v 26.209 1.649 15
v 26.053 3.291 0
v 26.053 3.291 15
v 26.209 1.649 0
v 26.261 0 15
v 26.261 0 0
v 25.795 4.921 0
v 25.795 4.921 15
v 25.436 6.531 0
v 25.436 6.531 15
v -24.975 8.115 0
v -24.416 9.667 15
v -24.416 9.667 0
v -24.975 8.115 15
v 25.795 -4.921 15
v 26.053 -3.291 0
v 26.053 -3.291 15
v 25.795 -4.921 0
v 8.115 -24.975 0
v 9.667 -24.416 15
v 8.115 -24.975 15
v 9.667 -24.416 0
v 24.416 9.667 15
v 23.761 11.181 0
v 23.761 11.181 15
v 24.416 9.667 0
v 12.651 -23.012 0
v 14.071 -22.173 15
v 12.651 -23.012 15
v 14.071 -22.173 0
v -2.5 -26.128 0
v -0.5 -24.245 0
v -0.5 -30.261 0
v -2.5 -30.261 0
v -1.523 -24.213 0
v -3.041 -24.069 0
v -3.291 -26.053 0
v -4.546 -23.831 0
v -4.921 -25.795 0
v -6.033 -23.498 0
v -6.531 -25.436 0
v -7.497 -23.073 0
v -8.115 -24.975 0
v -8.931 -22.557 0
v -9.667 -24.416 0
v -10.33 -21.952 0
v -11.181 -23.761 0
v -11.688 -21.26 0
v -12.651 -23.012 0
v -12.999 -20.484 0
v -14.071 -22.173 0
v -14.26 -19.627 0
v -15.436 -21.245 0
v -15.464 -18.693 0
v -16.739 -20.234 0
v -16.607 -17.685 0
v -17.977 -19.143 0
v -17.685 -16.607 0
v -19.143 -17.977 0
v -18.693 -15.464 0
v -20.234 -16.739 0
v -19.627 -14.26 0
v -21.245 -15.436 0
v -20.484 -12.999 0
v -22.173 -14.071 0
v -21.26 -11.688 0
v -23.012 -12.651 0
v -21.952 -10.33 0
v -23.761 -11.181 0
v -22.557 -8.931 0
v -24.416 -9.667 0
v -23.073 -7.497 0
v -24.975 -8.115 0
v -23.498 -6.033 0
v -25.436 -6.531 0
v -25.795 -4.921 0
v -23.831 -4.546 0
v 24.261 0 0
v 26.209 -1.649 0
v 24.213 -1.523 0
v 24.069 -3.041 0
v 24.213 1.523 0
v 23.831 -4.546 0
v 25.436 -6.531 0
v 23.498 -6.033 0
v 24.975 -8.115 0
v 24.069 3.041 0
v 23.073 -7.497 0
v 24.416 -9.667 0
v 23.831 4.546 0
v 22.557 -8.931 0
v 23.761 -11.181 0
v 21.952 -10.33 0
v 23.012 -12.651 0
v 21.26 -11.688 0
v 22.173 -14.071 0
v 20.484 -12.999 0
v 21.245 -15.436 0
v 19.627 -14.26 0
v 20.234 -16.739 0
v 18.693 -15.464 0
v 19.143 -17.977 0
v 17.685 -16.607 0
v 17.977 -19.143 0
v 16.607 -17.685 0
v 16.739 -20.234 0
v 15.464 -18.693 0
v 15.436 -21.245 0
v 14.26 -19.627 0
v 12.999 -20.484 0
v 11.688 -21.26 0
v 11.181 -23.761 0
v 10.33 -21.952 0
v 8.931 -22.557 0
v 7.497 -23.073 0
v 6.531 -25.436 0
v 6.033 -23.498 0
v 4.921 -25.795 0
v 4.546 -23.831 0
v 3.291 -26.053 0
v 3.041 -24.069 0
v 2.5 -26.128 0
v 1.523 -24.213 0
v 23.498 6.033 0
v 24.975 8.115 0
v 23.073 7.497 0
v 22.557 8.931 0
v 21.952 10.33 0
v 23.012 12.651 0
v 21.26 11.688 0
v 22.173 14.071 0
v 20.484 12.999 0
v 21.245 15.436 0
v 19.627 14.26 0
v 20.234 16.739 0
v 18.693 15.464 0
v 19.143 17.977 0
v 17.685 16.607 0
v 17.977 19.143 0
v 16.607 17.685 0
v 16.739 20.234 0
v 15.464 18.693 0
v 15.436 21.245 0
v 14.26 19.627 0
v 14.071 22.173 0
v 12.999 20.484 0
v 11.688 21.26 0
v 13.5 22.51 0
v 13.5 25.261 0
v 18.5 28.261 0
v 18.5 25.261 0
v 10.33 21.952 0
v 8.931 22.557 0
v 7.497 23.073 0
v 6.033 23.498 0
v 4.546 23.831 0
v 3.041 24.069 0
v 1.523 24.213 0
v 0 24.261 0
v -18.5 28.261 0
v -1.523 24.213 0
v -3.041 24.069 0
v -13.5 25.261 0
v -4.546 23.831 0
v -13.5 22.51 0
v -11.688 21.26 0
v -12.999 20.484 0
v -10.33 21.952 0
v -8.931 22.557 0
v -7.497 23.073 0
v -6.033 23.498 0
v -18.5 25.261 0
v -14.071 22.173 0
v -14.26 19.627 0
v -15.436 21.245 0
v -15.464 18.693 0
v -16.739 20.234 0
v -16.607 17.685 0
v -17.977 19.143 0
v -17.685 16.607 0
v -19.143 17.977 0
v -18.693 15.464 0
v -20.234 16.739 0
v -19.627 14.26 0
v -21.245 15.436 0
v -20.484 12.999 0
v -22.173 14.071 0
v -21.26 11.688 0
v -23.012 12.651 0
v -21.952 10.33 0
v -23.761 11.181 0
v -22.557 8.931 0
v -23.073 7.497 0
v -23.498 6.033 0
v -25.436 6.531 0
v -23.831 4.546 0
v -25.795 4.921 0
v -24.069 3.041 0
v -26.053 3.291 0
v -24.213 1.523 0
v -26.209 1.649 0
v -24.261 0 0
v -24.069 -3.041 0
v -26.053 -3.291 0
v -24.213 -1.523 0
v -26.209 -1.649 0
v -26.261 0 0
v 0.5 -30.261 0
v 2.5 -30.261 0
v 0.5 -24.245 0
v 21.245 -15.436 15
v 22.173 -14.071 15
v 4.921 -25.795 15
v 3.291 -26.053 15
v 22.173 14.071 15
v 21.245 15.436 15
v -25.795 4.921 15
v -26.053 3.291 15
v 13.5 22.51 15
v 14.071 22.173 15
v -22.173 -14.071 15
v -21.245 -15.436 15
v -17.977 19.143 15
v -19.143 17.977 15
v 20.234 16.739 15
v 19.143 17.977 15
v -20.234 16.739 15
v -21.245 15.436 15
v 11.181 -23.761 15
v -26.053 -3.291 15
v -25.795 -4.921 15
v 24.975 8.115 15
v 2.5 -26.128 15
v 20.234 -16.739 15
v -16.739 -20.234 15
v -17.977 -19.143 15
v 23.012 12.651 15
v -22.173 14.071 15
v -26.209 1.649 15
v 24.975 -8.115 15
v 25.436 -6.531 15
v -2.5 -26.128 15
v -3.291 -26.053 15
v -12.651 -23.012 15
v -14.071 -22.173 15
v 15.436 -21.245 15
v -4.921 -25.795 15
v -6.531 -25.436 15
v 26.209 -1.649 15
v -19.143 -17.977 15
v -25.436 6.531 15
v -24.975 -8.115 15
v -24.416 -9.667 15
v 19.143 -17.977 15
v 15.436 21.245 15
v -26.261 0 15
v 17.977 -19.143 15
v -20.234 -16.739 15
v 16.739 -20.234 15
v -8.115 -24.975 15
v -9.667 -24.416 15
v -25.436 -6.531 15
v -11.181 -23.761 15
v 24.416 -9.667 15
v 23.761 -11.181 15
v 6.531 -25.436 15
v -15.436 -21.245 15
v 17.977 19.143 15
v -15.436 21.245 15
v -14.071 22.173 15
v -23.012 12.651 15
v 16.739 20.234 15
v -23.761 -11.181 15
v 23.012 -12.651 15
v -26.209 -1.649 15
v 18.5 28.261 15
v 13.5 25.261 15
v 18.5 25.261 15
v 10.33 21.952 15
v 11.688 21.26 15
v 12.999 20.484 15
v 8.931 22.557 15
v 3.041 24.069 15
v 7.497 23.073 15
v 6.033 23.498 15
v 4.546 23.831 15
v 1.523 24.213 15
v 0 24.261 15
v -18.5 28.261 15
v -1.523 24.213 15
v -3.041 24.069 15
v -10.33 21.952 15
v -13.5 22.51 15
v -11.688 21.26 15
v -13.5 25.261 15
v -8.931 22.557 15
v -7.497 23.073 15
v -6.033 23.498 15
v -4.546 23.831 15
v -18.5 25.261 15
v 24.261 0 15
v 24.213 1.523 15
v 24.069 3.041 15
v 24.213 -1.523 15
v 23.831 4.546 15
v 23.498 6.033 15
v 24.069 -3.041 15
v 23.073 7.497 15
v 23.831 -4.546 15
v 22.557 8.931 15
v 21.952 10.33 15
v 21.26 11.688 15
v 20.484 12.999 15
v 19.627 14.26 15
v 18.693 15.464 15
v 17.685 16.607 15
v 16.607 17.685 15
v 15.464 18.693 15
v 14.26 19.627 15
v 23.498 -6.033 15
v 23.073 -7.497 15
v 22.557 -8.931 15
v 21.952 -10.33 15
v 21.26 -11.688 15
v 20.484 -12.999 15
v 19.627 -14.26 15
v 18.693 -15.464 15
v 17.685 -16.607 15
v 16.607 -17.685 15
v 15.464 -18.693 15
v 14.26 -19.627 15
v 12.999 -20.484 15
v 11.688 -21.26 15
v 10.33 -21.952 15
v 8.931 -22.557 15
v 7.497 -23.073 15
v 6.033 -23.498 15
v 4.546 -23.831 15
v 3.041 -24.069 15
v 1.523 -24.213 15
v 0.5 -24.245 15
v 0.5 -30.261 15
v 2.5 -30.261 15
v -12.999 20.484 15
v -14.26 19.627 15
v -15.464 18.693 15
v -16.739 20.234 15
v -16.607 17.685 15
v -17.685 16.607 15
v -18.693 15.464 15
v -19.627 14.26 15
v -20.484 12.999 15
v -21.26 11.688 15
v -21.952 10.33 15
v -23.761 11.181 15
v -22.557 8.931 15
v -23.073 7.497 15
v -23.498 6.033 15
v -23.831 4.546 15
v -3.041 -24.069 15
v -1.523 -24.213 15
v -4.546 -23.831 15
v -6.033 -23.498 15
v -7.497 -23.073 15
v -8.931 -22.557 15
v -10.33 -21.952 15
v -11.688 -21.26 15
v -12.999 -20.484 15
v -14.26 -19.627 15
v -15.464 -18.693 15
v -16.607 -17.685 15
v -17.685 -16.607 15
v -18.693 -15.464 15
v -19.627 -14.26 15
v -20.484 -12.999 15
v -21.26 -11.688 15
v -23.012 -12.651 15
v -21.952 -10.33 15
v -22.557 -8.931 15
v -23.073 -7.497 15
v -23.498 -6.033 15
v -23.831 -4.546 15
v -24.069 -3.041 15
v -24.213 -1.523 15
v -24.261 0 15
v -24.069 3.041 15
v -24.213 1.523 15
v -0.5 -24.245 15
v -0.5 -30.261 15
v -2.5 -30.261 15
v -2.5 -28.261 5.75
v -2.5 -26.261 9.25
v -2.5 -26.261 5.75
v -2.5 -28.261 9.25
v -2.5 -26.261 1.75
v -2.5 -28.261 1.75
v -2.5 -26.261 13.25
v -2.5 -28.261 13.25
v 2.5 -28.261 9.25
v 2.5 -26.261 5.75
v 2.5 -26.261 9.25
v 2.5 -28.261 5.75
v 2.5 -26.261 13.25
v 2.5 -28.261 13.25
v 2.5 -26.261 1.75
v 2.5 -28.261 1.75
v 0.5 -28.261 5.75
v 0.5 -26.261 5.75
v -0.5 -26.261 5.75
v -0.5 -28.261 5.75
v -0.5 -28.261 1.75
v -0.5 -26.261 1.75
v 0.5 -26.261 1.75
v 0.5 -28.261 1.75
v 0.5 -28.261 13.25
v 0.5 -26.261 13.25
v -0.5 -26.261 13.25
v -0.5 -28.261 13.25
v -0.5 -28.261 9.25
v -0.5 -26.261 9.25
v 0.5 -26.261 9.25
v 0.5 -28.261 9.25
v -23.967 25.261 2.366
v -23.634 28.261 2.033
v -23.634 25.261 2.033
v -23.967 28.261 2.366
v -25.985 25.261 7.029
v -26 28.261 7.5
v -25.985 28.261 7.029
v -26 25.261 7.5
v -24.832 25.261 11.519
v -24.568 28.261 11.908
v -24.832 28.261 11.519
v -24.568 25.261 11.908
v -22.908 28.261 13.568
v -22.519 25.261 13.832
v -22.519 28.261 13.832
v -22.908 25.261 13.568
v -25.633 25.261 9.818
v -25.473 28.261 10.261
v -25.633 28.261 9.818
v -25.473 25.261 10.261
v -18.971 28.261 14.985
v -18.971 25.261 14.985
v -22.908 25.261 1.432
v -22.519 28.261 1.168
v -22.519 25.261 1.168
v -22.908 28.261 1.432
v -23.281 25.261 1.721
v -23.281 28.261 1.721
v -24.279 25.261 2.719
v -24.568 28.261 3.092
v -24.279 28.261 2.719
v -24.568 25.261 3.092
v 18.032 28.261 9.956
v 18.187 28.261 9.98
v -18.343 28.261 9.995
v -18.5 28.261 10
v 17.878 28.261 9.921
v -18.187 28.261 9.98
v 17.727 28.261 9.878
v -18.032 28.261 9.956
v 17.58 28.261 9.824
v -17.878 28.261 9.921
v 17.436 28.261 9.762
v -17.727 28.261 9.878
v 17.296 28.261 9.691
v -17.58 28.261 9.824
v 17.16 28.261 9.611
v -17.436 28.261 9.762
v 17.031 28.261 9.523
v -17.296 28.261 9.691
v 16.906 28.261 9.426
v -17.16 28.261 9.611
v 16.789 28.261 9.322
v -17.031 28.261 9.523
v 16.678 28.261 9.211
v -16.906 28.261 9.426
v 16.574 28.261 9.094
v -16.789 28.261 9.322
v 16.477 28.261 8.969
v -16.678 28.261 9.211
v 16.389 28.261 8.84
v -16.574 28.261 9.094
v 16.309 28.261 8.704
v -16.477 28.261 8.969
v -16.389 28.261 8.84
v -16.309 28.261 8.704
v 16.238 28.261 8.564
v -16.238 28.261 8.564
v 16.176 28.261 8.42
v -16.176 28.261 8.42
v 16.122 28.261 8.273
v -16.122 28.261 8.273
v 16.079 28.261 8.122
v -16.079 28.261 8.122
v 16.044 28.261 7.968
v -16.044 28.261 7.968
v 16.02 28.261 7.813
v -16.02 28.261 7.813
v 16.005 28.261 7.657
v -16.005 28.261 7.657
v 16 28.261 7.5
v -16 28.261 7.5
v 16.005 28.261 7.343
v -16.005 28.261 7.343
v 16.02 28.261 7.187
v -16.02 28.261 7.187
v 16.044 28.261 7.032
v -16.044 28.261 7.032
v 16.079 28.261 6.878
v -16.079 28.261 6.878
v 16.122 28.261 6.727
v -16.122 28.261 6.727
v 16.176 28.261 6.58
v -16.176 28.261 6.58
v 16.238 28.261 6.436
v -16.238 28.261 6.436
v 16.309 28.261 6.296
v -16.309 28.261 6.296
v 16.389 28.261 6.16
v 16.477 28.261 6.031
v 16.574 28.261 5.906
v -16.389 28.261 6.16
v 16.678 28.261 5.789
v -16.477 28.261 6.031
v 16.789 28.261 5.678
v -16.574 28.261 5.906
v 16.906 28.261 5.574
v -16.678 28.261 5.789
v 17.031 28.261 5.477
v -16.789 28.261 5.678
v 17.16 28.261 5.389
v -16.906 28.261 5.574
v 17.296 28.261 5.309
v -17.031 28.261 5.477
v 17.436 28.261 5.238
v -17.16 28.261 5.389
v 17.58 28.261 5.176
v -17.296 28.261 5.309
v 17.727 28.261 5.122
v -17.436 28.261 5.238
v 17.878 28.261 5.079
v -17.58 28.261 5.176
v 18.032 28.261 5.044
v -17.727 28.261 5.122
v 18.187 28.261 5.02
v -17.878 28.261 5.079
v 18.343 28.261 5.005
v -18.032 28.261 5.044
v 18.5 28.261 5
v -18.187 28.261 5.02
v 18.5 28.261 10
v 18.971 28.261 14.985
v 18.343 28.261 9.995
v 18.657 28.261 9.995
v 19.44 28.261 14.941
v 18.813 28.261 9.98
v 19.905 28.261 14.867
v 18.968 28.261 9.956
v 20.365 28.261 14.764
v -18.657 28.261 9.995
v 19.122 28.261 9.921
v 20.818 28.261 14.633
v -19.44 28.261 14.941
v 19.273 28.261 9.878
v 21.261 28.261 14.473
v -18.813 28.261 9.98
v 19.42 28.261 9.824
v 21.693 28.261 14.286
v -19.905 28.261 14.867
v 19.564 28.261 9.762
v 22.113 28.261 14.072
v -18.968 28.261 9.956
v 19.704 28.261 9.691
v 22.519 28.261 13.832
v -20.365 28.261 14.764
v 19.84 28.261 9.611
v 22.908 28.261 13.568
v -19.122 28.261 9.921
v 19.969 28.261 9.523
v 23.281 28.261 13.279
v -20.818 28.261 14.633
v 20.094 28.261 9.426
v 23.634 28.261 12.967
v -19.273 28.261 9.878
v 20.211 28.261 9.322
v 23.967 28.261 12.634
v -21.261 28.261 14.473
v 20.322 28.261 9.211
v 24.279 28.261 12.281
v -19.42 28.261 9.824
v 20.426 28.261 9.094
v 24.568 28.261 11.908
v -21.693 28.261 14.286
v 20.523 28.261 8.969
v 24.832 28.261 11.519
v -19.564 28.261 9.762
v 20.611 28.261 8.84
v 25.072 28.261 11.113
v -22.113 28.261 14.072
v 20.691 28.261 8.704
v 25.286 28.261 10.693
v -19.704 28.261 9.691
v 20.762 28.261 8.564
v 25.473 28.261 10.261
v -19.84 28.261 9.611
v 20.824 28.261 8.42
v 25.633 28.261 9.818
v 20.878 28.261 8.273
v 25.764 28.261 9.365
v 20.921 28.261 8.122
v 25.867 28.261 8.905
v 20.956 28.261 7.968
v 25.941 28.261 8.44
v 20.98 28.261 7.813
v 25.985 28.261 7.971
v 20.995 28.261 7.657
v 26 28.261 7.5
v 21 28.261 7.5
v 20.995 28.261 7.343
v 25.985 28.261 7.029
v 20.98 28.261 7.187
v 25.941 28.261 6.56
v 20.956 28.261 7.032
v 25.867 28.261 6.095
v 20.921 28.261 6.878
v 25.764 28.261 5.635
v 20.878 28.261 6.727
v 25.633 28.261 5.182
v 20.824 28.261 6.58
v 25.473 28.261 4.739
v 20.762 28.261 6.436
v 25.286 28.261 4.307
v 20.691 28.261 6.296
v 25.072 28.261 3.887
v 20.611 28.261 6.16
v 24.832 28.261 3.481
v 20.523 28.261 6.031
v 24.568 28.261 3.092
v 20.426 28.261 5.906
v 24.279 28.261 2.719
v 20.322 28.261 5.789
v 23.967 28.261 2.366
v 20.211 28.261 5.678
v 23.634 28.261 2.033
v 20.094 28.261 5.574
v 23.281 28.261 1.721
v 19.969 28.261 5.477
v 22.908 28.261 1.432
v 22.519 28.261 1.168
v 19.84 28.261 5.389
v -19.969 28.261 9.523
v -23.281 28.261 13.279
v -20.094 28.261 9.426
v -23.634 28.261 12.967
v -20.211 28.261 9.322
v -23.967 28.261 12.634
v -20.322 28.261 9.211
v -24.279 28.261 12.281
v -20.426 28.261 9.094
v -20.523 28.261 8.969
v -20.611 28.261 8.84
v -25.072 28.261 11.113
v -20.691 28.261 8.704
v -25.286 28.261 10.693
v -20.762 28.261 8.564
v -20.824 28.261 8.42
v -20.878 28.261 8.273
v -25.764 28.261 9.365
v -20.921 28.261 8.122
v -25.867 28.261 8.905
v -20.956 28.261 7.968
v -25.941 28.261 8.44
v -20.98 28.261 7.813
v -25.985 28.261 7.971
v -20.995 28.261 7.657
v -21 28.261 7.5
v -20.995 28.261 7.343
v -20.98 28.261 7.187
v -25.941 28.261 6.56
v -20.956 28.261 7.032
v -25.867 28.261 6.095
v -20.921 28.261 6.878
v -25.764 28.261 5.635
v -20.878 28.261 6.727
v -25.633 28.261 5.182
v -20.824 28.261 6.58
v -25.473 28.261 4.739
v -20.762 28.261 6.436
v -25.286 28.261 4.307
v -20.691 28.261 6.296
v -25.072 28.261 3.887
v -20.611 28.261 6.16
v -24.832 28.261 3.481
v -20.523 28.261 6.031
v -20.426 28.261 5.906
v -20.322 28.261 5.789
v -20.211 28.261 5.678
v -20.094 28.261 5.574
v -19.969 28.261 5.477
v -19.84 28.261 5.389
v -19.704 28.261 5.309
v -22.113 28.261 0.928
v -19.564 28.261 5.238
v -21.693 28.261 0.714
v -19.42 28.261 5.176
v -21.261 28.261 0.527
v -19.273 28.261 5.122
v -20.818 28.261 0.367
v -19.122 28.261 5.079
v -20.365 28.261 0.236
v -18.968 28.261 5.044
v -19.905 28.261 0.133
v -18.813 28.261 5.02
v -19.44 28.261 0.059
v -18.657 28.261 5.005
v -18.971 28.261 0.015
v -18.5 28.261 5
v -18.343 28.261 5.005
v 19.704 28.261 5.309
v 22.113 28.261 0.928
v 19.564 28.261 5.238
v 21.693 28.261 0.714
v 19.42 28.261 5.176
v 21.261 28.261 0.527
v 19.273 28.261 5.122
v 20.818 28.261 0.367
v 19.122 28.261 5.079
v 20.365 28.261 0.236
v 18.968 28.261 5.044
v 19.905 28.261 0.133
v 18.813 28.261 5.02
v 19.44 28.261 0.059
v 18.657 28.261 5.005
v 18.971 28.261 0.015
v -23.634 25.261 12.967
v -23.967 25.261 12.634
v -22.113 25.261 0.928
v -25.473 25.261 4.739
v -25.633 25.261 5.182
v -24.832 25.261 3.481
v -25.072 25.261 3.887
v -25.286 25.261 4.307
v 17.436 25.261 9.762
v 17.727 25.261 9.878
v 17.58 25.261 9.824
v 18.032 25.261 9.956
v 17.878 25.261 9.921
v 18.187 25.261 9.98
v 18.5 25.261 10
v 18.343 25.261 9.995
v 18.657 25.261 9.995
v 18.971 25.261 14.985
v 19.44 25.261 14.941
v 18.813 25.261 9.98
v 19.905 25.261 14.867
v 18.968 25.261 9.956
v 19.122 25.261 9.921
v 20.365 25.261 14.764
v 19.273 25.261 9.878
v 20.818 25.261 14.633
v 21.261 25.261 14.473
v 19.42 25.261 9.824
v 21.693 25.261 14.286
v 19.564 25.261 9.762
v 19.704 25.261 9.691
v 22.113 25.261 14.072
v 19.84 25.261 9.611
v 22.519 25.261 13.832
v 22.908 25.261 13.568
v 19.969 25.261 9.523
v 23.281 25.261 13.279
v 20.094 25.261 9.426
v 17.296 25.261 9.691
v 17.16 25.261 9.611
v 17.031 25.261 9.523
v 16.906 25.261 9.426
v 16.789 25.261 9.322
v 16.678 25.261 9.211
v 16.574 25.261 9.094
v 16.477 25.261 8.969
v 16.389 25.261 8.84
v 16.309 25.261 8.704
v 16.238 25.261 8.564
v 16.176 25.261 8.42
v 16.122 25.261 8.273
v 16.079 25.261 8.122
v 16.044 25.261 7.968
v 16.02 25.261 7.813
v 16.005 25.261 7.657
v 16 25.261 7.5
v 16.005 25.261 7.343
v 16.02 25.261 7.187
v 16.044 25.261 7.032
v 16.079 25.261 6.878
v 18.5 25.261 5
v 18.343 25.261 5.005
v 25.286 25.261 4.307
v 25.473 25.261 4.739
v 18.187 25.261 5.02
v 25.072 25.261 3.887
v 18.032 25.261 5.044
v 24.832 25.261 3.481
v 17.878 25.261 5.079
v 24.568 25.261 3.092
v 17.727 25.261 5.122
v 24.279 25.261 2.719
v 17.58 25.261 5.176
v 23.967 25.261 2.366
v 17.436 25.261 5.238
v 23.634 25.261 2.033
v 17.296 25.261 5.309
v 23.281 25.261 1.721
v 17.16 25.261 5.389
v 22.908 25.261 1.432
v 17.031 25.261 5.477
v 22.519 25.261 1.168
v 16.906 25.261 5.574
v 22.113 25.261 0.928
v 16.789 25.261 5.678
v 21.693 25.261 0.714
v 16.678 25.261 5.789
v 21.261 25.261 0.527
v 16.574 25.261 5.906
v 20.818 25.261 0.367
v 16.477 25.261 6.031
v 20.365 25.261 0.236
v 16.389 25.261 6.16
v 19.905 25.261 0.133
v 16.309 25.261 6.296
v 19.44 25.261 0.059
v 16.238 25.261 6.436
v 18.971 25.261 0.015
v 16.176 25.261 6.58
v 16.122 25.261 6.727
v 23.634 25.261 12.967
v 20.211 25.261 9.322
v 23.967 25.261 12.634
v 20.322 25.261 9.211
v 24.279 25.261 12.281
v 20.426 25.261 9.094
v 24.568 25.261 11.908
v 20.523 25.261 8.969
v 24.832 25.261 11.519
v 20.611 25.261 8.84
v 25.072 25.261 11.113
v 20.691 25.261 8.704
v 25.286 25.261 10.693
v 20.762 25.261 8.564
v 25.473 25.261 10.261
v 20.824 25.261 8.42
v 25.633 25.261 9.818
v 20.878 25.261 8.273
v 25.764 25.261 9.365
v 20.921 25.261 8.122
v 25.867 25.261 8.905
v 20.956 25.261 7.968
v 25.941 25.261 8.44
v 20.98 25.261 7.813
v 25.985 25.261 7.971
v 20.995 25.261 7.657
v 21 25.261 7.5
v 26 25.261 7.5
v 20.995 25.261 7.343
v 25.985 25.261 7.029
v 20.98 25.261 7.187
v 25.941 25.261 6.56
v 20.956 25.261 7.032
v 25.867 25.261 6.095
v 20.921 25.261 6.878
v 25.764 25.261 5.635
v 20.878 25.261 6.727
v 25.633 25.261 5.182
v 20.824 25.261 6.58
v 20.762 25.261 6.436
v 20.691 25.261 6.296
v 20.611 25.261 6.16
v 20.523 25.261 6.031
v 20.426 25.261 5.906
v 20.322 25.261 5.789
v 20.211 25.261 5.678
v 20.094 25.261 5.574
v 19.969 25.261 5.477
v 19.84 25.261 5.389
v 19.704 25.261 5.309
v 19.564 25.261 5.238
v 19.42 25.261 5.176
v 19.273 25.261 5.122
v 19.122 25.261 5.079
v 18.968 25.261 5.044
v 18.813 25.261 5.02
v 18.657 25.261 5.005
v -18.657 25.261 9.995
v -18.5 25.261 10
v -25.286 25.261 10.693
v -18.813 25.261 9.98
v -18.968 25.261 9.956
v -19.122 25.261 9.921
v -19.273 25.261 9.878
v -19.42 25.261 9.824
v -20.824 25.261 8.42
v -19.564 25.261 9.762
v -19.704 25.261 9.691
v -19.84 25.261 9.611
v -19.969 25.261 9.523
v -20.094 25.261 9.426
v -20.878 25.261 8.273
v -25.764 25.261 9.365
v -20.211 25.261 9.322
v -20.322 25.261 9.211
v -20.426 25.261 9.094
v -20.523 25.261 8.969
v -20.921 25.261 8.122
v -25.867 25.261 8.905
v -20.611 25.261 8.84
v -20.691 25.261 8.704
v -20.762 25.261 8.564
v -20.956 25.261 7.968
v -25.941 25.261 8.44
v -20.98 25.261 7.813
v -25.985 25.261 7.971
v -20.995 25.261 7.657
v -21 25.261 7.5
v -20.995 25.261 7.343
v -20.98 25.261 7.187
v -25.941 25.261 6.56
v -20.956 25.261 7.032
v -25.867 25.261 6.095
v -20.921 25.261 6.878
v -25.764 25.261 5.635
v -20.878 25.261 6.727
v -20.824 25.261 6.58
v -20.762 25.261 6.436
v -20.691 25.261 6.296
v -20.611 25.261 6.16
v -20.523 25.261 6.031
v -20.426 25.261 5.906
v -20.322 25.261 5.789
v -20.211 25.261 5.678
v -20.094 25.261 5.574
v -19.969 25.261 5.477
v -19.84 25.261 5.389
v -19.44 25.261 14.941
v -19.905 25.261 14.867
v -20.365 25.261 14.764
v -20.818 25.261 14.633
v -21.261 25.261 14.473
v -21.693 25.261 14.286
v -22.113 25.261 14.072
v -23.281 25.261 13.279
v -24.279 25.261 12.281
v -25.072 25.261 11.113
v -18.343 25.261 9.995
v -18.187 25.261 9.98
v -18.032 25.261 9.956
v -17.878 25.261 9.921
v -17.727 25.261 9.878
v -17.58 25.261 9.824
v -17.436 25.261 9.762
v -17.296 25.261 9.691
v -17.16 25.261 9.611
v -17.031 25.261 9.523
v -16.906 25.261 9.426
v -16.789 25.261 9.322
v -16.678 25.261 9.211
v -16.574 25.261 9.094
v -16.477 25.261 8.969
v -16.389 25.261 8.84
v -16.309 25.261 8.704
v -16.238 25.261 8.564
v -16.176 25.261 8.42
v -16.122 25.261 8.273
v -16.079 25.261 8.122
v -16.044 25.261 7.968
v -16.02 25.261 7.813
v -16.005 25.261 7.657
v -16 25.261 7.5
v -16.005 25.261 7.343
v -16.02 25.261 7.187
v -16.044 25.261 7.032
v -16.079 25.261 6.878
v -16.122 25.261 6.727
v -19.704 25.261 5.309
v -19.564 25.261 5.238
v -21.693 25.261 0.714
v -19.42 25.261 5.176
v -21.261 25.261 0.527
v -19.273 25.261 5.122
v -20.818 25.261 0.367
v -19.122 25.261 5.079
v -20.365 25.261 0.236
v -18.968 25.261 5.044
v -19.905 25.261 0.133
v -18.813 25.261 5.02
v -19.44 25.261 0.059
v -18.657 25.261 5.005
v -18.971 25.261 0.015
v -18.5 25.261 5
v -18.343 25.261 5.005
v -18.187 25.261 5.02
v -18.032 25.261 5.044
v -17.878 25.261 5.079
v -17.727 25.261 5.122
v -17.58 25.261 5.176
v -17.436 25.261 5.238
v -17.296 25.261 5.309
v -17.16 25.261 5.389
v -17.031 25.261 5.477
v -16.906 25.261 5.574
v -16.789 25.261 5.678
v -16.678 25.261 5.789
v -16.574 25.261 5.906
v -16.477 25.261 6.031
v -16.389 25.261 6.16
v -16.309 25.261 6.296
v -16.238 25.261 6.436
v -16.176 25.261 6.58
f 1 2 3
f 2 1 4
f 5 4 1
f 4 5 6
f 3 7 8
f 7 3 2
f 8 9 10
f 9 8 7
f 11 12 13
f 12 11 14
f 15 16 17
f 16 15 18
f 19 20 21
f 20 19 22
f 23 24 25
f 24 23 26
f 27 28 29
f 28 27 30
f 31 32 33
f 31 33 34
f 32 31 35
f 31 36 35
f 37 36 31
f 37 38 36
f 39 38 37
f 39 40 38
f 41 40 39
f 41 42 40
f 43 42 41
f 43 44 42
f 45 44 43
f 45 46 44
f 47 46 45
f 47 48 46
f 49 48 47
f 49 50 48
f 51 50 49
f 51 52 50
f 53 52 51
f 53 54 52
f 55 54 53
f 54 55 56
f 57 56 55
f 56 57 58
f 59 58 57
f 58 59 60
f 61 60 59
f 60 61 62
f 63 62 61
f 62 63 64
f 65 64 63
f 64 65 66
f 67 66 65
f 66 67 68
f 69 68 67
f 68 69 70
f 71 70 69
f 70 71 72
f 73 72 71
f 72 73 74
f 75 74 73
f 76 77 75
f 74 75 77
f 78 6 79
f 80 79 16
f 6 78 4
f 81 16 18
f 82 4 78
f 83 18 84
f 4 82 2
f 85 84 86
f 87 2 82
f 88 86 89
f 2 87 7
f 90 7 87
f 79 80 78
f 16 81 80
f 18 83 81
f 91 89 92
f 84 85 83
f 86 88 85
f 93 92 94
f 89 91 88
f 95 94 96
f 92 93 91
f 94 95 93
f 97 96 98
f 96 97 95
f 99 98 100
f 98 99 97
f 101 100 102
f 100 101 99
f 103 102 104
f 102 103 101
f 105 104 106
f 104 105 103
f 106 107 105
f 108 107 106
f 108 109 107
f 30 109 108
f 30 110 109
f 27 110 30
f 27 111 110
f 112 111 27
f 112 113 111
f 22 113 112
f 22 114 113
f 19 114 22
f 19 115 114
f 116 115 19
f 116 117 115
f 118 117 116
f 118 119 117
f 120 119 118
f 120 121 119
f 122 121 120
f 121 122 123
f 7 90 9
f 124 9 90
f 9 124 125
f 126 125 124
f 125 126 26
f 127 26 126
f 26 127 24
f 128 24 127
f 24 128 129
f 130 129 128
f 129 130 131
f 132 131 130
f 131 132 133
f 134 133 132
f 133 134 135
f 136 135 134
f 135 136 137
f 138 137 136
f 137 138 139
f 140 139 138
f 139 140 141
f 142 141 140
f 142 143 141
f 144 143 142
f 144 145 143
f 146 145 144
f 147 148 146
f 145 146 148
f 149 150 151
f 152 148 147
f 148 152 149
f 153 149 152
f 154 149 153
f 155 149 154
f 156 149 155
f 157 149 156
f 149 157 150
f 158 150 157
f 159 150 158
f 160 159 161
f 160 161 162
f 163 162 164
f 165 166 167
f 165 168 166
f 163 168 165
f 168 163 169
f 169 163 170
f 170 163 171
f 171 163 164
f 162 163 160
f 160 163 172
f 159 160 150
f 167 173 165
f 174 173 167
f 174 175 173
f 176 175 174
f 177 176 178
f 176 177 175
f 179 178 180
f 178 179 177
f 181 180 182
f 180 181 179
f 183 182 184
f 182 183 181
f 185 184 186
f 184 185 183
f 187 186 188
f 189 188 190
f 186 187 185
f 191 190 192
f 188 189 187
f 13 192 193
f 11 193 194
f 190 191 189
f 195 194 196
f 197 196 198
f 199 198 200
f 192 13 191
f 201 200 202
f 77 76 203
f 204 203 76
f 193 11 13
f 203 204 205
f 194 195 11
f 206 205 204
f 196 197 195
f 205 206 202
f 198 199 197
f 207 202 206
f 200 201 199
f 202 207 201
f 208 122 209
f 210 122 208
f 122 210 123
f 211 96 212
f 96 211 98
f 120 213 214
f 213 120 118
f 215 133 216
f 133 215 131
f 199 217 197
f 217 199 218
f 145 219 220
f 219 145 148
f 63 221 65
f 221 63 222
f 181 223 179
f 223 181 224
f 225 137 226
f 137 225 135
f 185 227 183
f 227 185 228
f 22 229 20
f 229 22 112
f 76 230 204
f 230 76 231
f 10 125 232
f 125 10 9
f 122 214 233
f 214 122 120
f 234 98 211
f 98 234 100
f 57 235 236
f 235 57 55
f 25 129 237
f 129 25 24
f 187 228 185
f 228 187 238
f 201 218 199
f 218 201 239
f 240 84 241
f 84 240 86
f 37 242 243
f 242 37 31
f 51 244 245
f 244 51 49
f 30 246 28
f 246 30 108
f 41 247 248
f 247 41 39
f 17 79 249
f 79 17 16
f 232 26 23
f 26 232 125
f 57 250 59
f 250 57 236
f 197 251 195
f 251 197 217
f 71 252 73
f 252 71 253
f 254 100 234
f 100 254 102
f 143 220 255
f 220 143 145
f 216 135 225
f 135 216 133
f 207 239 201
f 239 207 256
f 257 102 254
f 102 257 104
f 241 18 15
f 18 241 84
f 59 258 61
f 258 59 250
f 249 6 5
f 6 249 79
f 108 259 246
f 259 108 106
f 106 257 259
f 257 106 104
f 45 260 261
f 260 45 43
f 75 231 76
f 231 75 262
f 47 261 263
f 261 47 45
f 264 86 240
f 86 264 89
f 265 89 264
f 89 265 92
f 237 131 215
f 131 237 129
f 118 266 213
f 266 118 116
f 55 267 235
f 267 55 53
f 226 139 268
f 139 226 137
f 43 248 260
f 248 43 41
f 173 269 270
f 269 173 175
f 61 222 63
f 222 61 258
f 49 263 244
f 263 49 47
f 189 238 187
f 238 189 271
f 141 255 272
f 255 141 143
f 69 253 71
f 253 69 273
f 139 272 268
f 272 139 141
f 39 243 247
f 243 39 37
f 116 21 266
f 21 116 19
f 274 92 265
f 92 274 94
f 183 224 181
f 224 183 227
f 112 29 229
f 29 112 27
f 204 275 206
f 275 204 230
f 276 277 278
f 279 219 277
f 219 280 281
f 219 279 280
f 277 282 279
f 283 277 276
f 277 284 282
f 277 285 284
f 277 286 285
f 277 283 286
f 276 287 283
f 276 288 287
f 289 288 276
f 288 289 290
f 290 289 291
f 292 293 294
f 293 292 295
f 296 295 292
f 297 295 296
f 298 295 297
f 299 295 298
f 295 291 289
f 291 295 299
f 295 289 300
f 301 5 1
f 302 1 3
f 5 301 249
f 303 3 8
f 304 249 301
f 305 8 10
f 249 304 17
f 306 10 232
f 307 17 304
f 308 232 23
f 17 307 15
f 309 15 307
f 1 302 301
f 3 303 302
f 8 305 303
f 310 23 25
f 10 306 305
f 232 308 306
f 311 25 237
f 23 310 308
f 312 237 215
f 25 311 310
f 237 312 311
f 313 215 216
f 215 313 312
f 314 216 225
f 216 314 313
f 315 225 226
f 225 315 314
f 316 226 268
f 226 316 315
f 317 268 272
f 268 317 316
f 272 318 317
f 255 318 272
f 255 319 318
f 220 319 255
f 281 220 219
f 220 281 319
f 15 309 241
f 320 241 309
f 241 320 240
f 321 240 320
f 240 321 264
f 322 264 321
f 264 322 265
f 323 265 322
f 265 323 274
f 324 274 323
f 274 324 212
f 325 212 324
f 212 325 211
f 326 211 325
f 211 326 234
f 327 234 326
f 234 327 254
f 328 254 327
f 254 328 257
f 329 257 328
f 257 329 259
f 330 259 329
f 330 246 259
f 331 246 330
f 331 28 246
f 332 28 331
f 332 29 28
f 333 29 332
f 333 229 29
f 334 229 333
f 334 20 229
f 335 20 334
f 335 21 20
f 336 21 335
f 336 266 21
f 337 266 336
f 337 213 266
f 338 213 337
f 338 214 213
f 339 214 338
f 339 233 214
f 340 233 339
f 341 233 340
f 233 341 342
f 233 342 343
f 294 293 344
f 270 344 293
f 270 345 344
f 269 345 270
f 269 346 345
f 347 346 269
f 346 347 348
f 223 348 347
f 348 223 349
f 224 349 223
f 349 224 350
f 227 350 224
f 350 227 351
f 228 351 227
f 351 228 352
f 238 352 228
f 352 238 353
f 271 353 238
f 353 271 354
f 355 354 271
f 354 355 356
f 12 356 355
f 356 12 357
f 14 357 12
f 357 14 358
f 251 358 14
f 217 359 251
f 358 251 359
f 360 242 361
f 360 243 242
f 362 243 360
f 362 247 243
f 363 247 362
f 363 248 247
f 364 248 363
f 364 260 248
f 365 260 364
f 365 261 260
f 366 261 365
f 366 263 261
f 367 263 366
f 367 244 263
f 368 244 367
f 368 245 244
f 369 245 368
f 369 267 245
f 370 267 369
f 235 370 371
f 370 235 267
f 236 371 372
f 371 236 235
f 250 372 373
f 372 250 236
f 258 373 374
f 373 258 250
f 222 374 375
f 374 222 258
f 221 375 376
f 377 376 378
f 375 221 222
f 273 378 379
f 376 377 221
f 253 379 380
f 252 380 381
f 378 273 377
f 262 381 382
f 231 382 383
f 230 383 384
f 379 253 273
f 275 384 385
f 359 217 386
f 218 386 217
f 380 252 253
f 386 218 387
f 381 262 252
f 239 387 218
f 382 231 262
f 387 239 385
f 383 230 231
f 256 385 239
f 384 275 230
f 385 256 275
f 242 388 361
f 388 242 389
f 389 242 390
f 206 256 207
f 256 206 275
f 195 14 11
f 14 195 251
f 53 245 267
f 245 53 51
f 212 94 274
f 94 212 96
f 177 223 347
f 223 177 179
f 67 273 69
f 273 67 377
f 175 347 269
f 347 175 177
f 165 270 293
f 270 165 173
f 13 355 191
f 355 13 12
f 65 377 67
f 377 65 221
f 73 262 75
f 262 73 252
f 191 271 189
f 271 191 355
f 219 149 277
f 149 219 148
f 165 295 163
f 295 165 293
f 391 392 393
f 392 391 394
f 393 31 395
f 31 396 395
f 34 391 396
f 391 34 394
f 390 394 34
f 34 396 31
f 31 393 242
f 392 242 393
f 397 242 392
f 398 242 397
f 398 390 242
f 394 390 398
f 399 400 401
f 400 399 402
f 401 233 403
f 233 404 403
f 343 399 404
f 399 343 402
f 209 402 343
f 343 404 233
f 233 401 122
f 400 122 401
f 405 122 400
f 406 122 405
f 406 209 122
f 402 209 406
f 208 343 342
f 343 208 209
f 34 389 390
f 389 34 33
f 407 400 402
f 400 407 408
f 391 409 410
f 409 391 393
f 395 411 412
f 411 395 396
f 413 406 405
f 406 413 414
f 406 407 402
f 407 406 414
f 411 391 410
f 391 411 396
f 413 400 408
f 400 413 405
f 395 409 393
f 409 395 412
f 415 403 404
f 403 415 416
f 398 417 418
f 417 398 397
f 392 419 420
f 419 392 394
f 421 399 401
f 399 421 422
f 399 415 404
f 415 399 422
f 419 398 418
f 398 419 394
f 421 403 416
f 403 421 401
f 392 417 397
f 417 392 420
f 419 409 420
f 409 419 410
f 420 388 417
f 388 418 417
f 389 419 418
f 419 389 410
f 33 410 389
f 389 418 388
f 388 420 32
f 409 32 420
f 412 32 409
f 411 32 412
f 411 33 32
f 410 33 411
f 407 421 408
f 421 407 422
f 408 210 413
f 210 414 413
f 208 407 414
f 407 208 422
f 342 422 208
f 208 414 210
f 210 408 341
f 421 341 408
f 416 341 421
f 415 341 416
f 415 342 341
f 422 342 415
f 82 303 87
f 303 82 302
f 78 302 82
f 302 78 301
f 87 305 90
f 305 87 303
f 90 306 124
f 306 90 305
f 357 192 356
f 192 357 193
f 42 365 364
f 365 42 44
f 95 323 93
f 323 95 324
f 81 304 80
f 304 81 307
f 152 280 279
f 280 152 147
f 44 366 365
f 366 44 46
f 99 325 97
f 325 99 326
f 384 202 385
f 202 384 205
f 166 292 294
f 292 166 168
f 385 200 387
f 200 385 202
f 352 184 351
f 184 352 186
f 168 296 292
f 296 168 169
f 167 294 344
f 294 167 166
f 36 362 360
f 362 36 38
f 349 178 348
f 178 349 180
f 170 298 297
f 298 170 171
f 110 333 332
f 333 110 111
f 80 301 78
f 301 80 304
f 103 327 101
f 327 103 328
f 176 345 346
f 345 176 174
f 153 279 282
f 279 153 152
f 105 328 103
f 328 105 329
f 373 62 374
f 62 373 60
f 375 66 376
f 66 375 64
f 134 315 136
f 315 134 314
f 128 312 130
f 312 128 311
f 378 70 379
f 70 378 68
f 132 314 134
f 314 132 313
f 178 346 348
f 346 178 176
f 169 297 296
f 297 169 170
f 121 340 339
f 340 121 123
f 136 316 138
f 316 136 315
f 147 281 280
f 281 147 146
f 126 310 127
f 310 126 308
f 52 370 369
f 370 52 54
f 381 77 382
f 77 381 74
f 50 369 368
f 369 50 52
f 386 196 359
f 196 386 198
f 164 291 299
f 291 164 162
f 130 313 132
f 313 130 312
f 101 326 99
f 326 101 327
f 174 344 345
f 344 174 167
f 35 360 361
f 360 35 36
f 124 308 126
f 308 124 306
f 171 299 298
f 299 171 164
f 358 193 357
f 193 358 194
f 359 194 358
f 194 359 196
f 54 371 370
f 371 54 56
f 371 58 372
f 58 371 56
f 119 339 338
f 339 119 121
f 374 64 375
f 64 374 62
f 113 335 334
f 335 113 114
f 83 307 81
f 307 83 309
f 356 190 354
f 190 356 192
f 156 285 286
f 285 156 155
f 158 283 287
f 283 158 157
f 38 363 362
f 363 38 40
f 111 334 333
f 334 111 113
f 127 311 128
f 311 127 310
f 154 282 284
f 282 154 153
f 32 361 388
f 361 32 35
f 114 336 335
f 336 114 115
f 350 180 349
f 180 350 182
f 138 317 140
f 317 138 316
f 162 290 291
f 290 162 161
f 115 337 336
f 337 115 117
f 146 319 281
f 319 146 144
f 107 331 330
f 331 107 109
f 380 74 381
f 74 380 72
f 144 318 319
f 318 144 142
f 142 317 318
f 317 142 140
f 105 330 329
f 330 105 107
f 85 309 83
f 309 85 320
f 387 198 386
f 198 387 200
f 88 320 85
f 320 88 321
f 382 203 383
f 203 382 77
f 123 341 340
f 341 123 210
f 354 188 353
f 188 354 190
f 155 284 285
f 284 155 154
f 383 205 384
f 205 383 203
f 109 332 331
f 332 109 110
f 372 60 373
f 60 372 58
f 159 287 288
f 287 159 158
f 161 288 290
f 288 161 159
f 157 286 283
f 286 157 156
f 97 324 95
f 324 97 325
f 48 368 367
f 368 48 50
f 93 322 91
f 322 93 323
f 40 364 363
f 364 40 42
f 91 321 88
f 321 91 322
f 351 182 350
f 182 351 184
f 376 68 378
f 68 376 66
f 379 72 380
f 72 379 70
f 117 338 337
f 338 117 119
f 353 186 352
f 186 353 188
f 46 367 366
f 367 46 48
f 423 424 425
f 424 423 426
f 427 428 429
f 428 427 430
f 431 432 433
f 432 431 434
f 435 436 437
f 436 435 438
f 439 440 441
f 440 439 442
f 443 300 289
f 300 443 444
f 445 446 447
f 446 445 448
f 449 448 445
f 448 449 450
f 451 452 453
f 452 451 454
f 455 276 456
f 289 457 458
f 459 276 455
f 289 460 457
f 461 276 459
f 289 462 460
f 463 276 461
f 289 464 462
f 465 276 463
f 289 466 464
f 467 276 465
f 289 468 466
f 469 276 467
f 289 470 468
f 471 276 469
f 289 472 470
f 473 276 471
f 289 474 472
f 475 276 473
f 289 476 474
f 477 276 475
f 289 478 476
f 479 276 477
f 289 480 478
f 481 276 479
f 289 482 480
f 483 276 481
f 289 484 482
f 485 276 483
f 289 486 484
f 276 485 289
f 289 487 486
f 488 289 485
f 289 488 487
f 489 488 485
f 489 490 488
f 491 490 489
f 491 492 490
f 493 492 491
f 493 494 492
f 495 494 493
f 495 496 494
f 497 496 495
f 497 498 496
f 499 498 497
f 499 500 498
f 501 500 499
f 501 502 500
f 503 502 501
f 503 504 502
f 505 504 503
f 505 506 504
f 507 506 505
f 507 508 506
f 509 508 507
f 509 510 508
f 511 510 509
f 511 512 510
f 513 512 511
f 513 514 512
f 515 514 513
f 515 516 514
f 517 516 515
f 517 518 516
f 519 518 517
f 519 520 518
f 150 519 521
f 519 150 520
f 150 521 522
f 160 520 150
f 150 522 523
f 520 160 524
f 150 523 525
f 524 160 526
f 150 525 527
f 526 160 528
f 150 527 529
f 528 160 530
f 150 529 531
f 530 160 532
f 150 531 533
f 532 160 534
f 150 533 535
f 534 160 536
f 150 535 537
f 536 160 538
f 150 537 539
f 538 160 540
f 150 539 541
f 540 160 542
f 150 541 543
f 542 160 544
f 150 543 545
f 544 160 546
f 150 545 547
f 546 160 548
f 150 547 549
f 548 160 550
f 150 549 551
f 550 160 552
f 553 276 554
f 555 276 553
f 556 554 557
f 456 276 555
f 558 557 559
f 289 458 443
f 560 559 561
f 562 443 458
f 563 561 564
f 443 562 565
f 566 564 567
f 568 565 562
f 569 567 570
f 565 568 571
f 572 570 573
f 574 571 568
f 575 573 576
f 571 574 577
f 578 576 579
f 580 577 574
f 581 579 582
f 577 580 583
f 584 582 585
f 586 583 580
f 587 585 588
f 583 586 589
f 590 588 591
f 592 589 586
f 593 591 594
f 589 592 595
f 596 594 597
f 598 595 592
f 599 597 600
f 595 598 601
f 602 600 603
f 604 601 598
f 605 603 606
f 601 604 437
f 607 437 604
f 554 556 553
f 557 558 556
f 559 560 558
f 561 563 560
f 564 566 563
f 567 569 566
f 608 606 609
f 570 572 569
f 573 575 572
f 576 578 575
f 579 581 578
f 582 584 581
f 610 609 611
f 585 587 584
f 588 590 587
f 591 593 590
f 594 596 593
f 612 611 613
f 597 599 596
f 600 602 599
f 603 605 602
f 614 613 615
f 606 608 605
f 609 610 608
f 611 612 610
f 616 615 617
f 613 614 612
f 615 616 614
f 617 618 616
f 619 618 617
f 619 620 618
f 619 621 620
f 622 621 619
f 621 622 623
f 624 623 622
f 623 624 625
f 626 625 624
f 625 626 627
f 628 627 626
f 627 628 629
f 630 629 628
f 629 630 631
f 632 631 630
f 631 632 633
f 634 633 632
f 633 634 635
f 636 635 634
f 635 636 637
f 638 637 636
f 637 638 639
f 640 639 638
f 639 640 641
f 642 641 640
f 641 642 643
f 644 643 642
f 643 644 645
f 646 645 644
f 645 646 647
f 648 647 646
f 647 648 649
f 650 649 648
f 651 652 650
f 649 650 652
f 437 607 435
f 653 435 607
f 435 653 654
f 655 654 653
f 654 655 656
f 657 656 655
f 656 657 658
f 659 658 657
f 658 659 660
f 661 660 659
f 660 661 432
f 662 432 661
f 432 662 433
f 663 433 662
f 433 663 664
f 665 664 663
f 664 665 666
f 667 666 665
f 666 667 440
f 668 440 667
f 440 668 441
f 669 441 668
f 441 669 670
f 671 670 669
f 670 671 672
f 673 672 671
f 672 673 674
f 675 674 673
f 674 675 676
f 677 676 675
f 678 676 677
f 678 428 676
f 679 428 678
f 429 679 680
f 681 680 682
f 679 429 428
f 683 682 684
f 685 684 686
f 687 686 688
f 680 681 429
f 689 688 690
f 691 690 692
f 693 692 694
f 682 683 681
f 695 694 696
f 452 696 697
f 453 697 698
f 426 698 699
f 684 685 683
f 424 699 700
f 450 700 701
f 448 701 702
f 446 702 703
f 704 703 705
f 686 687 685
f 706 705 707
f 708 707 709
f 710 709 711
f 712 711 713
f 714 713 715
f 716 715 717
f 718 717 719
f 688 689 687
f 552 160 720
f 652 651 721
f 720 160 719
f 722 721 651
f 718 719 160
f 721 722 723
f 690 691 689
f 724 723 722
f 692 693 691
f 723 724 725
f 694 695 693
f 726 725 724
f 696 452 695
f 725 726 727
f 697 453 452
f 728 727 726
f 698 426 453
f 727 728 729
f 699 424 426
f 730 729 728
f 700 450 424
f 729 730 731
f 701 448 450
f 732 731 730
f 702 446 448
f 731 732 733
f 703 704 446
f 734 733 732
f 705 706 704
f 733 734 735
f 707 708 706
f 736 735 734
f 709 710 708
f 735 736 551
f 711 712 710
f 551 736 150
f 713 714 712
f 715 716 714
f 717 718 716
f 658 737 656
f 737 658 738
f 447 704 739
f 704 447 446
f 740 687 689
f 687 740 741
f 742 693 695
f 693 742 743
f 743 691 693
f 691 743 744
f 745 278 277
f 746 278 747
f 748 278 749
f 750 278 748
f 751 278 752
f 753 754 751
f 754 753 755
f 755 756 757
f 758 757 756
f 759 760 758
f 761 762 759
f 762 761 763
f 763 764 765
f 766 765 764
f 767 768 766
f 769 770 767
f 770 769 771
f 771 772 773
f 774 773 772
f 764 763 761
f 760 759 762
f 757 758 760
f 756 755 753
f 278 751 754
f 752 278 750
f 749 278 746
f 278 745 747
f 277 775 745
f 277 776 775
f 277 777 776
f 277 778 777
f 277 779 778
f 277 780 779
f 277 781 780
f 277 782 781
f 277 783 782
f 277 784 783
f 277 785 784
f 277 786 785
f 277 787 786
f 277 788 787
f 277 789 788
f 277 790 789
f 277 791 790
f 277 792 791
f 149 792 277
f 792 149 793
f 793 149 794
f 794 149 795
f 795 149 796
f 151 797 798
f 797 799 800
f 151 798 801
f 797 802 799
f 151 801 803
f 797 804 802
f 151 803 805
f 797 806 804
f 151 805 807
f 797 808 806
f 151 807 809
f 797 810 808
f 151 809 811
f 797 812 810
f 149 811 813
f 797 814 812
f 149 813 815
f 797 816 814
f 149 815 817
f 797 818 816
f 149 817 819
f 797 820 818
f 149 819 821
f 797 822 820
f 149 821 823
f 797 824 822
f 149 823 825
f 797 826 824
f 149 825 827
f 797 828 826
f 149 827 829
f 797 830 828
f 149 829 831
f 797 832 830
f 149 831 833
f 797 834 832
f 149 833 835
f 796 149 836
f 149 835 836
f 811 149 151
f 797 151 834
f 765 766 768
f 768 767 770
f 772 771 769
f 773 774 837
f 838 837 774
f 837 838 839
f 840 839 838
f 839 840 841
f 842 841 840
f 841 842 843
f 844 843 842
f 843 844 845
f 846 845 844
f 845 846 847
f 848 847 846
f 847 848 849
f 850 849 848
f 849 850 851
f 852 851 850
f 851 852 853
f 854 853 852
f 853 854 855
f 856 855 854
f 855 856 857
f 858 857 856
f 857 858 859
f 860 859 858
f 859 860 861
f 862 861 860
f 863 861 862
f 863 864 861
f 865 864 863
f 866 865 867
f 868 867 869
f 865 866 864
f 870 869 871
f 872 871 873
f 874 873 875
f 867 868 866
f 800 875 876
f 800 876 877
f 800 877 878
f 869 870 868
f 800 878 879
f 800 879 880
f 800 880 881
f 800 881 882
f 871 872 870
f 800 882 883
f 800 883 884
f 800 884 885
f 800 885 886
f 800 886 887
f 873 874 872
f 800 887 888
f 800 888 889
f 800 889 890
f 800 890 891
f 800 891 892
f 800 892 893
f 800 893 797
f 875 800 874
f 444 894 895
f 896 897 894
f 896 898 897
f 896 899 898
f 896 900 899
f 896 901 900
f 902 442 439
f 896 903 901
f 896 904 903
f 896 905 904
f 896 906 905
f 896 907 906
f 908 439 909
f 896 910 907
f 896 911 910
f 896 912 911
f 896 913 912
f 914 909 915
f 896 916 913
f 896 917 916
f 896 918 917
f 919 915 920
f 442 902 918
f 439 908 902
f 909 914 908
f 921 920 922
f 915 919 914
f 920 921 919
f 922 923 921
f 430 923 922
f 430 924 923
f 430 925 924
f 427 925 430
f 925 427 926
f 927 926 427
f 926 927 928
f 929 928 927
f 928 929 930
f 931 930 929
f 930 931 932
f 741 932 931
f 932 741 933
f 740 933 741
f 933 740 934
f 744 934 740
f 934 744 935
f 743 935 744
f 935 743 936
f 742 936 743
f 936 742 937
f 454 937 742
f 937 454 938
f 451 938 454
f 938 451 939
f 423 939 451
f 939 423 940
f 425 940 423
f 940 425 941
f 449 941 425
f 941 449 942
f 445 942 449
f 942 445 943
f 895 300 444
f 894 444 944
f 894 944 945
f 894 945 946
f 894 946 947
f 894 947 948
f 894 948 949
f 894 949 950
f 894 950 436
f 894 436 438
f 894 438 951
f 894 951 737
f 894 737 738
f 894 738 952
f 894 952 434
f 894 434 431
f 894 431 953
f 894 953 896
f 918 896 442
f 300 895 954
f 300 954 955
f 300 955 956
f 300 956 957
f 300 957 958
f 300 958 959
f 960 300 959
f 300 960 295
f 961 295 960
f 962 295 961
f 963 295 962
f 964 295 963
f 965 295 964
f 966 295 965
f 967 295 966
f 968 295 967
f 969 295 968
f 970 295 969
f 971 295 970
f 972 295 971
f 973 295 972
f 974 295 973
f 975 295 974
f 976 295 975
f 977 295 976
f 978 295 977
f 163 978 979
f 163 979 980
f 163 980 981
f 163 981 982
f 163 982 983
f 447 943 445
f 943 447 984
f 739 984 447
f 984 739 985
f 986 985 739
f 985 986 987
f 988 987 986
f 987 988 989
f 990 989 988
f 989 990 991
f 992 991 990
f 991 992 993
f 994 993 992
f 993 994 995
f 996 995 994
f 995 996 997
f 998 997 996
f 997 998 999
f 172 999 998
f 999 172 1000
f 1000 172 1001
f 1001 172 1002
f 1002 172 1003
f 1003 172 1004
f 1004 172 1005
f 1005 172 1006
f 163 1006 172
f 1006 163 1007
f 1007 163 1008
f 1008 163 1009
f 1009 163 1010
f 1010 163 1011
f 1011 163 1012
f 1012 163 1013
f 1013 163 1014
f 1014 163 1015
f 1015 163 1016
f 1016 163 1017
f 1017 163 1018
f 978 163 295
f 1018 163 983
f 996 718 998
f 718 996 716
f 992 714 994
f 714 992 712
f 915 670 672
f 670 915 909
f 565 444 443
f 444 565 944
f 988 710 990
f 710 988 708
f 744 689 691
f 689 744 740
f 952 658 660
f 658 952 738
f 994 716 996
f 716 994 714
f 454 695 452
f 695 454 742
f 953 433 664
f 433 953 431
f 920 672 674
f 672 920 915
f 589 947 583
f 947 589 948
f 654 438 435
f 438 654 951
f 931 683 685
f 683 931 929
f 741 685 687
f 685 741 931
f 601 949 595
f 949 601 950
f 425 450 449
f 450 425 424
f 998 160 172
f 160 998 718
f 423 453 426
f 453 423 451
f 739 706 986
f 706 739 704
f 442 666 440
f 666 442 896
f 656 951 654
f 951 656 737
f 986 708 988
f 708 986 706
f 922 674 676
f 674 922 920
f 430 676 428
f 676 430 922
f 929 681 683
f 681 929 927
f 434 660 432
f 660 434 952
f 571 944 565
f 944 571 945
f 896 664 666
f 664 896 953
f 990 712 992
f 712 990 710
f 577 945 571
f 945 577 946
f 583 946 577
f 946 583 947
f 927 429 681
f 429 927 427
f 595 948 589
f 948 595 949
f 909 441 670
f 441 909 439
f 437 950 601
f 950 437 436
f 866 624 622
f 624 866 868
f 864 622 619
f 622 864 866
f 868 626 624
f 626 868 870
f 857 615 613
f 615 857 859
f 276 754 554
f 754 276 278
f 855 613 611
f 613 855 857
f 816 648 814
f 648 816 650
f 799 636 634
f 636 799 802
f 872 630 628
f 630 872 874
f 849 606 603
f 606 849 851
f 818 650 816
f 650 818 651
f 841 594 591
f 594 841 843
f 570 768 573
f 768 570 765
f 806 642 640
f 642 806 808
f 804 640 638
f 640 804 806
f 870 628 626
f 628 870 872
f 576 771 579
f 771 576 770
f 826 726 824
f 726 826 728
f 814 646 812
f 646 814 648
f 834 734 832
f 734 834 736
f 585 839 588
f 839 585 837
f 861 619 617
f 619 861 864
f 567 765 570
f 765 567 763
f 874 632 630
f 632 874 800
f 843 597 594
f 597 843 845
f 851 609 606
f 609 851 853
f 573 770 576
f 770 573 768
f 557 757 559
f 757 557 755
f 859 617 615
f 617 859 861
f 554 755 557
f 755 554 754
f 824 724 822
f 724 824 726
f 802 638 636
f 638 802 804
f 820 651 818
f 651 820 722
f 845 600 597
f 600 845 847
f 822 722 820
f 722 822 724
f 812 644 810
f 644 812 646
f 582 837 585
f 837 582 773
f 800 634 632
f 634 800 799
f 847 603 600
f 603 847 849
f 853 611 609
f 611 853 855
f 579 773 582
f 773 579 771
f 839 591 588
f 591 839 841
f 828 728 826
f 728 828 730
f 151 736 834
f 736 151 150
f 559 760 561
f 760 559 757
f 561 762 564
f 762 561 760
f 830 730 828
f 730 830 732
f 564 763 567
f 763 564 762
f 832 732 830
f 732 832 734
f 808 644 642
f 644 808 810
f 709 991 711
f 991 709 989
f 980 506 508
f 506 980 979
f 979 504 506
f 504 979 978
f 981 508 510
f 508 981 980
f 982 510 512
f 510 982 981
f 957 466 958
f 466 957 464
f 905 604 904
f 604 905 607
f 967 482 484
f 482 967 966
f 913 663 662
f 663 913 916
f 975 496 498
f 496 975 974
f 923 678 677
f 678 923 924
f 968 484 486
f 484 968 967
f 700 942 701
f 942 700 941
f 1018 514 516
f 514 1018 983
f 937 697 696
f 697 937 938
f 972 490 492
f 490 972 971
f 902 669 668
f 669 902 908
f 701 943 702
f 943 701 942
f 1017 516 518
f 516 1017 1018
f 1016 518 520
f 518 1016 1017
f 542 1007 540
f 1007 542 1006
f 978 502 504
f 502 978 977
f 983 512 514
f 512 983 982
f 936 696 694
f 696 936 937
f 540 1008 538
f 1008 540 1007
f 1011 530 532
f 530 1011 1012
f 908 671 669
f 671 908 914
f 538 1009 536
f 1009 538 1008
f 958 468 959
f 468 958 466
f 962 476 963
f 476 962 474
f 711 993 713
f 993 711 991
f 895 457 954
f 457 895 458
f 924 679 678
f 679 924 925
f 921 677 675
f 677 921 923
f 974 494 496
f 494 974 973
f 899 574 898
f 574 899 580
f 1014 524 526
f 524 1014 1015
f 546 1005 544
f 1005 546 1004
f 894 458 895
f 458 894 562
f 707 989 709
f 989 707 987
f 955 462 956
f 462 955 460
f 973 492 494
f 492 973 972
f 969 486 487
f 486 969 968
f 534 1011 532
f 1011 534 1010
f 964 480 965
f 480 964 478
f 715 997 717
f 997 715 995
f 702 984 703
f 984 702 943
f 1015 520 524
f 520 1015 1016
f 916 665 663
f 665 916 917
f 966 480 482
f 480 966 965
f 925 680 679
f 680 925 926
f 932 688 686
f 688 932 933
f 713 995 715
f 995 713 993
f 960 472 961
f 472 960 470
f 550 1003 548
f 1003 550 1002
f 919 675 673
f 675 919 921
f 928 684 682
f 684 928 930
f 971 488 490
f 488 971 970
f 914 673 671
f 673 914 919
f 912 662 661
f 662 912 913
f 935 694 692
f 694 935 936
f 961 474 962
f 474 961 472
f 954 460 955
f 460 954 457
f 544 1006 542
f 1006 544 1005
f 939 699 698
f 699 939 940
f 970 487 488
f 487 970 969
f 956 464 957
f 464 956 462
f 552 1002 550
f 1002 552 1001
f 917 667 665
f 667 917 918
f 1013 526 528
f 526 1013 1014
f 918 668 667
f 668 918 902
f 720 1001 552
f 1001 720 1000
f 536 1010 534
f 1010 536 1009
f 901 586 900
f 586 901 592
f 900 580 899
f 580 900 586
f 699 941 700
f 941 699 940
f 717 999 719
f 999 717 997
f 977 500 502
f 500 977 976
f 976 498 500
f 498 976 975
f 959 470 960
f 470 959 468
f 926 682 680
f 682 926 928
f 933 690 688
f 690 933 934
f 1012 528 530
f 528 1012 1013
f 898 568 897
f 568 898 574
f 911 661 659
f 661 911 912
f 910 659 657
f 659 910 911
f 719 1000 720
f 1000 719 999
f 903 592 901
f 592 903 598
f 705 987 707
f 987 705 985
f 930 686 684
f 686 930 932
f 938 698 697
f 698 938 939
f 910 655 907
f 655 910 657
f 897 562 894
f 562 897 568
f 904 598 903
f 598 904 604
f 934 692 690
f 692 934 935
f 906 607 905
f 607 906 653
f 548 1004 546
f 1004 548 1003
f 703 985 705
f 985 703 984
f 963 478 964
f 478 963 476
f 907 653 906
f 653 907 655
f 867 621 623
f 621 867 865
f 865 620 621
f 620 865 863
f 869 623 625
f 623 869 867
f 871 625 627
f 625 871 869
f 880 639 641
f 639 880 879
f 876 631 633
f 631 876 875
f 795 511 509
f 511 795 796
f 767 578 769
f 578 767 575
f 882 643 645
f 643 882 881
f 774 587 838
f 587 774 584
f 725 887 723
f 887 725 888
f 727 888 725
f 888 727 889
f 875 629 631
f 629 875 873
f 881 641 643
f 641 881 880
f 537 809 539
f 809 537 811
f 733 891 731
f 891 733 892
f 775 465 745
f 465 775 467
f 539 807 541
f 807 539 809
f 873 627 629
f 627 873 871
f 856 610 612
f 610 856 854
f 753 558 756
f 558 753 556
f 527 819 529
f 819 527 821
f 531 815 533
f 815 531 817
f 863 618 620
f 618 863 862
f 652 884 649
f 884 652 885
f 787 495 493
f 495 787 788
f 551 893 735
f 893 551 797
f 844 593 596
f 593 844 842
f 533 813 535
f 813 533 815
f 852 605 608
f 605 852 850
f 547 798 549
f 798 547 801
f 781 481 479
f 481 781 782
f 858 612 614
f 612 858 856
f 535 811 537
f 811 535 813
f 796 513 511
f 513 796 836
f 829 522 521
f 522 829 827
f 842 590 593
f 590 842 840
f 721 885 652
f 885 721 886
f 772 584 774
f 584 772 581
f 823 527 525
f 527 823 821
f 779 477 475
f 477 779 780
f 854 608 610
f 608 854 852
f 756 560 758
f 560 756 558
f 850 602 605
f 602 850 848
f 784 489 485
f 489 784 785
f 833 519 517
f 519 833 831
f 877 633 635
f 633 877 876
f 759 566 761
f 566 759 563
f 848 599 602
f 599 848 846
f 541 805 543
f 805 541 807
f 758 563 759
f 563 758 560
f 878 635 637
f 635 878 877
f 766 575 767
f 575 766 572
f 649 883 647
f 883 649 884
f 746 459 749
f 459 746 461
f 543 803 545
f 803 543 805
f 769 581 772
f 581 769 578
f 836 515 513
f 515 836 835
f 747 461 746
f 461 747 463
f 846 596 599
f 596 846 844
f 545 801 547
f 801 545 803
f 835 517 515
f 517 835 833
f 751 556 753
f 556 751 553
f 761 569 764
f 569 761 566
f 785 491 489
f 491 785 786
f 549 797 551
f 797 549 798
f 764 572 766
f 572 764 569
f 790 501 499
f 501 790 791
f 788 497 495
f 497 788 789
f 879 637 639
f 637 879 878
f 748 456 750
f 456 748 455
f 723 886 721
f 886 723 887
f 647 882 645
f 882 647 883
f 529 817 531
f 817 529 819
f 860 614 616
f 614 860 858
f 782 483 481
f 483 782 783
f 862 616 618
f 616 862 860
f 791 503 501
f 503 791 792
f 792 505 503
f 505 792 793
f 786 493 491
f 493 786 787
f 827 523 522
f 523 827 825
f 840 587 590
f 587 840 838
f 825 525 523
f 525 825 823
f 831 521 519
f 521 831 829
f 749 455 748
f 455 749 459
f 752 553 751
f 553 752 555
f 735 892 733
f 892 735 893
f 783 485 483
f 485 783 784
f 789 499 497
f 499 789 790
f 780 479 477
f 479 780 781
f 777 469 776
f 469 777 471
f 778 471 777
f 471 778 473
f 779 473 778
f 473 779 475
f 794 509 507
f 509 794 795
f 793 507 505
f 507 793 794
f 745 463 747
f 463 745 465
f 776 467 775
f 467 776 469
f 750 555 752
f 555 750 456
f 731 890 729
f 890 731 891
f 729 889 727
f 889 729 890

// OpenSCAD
// Copyright 2019 Marcos Del Sol Vives
// SPDX-License-Identifier: ISC

$fn = 100;

height = 15;

ring_radius = 165 / PI / 2 - 2;
ring_thickness = 2;

bell_tab_thickness = 3;

screw_distance = 37;
screw_diam = 5;

slit = 1;

reinforcement_width = 27;
reinforcement_dist = 1;

tie_tab_thickness = 2;
tie_tab_size = 4;

tie_count = 2;
tie_width = 4;
tie_thickness = 2;

tie_tab_sum = 2 * tie_tab_thickness + slit;

difference() {
	union() {
		// Base cylinder
		cylinder(r=ring_radius + ring_thickness, h=height);

		// Reinforcement cube
		translate([-reinforcement_width/2, 0, 0])
			cube([reinforcement_width, ring_radius + ring_thickness + reinforcement_dist, height]);
		
		// Tie tab
		rotate([0, 0, 180])
			translate([-tie_tab_sum / 2, 0, 0])
				cube([tie_tab_sum, ring_radius + ring_thickness + tie_tab_size, height]);
	}

	// Hole for mounting
	cylinder(r=ring_radius, h=height+0.1);

	rotate([0, 0, 180]) {
		// Slit
		translate([-slit / 2, 0, 0])
			cube([slit, ring_radius + ring_thickness + tie_tab_size, height]);

		// Tie holes
		for (i = [0 : tie_count - 1]) {
			translate([-tie_tab_sum / 2, ring_radius + ring_thickness, (i + 0.5) * height / tie_count - tie_width / 2])
				#cube([tie_tab_sum, tie_thickness, tie_width]);
		}
	}
}

translate([-screw_distance / 2, ring_radius + reinforcement_dist, height / 2])
	rotate([-90, 0, 0]) {
		difference() {
			union() {
				cylinder(d=height, h=bell_tab_thickness);
				translate([0, -height / 2, 0])
					cube([screw_distance, height, bell_tab_thickness]);
				translate([screw_distance, 0, 0])
					cylinder(d=height, h=bell_tab_thickness);
			}
			cylinder(d=screw_diam, h=bell_tab_thickness+0.01);
			translate([screw_distance, 0, 0])
				cylinder(d=screw_diam, h=bell_tab_thickness+0.01);
		}
	}
